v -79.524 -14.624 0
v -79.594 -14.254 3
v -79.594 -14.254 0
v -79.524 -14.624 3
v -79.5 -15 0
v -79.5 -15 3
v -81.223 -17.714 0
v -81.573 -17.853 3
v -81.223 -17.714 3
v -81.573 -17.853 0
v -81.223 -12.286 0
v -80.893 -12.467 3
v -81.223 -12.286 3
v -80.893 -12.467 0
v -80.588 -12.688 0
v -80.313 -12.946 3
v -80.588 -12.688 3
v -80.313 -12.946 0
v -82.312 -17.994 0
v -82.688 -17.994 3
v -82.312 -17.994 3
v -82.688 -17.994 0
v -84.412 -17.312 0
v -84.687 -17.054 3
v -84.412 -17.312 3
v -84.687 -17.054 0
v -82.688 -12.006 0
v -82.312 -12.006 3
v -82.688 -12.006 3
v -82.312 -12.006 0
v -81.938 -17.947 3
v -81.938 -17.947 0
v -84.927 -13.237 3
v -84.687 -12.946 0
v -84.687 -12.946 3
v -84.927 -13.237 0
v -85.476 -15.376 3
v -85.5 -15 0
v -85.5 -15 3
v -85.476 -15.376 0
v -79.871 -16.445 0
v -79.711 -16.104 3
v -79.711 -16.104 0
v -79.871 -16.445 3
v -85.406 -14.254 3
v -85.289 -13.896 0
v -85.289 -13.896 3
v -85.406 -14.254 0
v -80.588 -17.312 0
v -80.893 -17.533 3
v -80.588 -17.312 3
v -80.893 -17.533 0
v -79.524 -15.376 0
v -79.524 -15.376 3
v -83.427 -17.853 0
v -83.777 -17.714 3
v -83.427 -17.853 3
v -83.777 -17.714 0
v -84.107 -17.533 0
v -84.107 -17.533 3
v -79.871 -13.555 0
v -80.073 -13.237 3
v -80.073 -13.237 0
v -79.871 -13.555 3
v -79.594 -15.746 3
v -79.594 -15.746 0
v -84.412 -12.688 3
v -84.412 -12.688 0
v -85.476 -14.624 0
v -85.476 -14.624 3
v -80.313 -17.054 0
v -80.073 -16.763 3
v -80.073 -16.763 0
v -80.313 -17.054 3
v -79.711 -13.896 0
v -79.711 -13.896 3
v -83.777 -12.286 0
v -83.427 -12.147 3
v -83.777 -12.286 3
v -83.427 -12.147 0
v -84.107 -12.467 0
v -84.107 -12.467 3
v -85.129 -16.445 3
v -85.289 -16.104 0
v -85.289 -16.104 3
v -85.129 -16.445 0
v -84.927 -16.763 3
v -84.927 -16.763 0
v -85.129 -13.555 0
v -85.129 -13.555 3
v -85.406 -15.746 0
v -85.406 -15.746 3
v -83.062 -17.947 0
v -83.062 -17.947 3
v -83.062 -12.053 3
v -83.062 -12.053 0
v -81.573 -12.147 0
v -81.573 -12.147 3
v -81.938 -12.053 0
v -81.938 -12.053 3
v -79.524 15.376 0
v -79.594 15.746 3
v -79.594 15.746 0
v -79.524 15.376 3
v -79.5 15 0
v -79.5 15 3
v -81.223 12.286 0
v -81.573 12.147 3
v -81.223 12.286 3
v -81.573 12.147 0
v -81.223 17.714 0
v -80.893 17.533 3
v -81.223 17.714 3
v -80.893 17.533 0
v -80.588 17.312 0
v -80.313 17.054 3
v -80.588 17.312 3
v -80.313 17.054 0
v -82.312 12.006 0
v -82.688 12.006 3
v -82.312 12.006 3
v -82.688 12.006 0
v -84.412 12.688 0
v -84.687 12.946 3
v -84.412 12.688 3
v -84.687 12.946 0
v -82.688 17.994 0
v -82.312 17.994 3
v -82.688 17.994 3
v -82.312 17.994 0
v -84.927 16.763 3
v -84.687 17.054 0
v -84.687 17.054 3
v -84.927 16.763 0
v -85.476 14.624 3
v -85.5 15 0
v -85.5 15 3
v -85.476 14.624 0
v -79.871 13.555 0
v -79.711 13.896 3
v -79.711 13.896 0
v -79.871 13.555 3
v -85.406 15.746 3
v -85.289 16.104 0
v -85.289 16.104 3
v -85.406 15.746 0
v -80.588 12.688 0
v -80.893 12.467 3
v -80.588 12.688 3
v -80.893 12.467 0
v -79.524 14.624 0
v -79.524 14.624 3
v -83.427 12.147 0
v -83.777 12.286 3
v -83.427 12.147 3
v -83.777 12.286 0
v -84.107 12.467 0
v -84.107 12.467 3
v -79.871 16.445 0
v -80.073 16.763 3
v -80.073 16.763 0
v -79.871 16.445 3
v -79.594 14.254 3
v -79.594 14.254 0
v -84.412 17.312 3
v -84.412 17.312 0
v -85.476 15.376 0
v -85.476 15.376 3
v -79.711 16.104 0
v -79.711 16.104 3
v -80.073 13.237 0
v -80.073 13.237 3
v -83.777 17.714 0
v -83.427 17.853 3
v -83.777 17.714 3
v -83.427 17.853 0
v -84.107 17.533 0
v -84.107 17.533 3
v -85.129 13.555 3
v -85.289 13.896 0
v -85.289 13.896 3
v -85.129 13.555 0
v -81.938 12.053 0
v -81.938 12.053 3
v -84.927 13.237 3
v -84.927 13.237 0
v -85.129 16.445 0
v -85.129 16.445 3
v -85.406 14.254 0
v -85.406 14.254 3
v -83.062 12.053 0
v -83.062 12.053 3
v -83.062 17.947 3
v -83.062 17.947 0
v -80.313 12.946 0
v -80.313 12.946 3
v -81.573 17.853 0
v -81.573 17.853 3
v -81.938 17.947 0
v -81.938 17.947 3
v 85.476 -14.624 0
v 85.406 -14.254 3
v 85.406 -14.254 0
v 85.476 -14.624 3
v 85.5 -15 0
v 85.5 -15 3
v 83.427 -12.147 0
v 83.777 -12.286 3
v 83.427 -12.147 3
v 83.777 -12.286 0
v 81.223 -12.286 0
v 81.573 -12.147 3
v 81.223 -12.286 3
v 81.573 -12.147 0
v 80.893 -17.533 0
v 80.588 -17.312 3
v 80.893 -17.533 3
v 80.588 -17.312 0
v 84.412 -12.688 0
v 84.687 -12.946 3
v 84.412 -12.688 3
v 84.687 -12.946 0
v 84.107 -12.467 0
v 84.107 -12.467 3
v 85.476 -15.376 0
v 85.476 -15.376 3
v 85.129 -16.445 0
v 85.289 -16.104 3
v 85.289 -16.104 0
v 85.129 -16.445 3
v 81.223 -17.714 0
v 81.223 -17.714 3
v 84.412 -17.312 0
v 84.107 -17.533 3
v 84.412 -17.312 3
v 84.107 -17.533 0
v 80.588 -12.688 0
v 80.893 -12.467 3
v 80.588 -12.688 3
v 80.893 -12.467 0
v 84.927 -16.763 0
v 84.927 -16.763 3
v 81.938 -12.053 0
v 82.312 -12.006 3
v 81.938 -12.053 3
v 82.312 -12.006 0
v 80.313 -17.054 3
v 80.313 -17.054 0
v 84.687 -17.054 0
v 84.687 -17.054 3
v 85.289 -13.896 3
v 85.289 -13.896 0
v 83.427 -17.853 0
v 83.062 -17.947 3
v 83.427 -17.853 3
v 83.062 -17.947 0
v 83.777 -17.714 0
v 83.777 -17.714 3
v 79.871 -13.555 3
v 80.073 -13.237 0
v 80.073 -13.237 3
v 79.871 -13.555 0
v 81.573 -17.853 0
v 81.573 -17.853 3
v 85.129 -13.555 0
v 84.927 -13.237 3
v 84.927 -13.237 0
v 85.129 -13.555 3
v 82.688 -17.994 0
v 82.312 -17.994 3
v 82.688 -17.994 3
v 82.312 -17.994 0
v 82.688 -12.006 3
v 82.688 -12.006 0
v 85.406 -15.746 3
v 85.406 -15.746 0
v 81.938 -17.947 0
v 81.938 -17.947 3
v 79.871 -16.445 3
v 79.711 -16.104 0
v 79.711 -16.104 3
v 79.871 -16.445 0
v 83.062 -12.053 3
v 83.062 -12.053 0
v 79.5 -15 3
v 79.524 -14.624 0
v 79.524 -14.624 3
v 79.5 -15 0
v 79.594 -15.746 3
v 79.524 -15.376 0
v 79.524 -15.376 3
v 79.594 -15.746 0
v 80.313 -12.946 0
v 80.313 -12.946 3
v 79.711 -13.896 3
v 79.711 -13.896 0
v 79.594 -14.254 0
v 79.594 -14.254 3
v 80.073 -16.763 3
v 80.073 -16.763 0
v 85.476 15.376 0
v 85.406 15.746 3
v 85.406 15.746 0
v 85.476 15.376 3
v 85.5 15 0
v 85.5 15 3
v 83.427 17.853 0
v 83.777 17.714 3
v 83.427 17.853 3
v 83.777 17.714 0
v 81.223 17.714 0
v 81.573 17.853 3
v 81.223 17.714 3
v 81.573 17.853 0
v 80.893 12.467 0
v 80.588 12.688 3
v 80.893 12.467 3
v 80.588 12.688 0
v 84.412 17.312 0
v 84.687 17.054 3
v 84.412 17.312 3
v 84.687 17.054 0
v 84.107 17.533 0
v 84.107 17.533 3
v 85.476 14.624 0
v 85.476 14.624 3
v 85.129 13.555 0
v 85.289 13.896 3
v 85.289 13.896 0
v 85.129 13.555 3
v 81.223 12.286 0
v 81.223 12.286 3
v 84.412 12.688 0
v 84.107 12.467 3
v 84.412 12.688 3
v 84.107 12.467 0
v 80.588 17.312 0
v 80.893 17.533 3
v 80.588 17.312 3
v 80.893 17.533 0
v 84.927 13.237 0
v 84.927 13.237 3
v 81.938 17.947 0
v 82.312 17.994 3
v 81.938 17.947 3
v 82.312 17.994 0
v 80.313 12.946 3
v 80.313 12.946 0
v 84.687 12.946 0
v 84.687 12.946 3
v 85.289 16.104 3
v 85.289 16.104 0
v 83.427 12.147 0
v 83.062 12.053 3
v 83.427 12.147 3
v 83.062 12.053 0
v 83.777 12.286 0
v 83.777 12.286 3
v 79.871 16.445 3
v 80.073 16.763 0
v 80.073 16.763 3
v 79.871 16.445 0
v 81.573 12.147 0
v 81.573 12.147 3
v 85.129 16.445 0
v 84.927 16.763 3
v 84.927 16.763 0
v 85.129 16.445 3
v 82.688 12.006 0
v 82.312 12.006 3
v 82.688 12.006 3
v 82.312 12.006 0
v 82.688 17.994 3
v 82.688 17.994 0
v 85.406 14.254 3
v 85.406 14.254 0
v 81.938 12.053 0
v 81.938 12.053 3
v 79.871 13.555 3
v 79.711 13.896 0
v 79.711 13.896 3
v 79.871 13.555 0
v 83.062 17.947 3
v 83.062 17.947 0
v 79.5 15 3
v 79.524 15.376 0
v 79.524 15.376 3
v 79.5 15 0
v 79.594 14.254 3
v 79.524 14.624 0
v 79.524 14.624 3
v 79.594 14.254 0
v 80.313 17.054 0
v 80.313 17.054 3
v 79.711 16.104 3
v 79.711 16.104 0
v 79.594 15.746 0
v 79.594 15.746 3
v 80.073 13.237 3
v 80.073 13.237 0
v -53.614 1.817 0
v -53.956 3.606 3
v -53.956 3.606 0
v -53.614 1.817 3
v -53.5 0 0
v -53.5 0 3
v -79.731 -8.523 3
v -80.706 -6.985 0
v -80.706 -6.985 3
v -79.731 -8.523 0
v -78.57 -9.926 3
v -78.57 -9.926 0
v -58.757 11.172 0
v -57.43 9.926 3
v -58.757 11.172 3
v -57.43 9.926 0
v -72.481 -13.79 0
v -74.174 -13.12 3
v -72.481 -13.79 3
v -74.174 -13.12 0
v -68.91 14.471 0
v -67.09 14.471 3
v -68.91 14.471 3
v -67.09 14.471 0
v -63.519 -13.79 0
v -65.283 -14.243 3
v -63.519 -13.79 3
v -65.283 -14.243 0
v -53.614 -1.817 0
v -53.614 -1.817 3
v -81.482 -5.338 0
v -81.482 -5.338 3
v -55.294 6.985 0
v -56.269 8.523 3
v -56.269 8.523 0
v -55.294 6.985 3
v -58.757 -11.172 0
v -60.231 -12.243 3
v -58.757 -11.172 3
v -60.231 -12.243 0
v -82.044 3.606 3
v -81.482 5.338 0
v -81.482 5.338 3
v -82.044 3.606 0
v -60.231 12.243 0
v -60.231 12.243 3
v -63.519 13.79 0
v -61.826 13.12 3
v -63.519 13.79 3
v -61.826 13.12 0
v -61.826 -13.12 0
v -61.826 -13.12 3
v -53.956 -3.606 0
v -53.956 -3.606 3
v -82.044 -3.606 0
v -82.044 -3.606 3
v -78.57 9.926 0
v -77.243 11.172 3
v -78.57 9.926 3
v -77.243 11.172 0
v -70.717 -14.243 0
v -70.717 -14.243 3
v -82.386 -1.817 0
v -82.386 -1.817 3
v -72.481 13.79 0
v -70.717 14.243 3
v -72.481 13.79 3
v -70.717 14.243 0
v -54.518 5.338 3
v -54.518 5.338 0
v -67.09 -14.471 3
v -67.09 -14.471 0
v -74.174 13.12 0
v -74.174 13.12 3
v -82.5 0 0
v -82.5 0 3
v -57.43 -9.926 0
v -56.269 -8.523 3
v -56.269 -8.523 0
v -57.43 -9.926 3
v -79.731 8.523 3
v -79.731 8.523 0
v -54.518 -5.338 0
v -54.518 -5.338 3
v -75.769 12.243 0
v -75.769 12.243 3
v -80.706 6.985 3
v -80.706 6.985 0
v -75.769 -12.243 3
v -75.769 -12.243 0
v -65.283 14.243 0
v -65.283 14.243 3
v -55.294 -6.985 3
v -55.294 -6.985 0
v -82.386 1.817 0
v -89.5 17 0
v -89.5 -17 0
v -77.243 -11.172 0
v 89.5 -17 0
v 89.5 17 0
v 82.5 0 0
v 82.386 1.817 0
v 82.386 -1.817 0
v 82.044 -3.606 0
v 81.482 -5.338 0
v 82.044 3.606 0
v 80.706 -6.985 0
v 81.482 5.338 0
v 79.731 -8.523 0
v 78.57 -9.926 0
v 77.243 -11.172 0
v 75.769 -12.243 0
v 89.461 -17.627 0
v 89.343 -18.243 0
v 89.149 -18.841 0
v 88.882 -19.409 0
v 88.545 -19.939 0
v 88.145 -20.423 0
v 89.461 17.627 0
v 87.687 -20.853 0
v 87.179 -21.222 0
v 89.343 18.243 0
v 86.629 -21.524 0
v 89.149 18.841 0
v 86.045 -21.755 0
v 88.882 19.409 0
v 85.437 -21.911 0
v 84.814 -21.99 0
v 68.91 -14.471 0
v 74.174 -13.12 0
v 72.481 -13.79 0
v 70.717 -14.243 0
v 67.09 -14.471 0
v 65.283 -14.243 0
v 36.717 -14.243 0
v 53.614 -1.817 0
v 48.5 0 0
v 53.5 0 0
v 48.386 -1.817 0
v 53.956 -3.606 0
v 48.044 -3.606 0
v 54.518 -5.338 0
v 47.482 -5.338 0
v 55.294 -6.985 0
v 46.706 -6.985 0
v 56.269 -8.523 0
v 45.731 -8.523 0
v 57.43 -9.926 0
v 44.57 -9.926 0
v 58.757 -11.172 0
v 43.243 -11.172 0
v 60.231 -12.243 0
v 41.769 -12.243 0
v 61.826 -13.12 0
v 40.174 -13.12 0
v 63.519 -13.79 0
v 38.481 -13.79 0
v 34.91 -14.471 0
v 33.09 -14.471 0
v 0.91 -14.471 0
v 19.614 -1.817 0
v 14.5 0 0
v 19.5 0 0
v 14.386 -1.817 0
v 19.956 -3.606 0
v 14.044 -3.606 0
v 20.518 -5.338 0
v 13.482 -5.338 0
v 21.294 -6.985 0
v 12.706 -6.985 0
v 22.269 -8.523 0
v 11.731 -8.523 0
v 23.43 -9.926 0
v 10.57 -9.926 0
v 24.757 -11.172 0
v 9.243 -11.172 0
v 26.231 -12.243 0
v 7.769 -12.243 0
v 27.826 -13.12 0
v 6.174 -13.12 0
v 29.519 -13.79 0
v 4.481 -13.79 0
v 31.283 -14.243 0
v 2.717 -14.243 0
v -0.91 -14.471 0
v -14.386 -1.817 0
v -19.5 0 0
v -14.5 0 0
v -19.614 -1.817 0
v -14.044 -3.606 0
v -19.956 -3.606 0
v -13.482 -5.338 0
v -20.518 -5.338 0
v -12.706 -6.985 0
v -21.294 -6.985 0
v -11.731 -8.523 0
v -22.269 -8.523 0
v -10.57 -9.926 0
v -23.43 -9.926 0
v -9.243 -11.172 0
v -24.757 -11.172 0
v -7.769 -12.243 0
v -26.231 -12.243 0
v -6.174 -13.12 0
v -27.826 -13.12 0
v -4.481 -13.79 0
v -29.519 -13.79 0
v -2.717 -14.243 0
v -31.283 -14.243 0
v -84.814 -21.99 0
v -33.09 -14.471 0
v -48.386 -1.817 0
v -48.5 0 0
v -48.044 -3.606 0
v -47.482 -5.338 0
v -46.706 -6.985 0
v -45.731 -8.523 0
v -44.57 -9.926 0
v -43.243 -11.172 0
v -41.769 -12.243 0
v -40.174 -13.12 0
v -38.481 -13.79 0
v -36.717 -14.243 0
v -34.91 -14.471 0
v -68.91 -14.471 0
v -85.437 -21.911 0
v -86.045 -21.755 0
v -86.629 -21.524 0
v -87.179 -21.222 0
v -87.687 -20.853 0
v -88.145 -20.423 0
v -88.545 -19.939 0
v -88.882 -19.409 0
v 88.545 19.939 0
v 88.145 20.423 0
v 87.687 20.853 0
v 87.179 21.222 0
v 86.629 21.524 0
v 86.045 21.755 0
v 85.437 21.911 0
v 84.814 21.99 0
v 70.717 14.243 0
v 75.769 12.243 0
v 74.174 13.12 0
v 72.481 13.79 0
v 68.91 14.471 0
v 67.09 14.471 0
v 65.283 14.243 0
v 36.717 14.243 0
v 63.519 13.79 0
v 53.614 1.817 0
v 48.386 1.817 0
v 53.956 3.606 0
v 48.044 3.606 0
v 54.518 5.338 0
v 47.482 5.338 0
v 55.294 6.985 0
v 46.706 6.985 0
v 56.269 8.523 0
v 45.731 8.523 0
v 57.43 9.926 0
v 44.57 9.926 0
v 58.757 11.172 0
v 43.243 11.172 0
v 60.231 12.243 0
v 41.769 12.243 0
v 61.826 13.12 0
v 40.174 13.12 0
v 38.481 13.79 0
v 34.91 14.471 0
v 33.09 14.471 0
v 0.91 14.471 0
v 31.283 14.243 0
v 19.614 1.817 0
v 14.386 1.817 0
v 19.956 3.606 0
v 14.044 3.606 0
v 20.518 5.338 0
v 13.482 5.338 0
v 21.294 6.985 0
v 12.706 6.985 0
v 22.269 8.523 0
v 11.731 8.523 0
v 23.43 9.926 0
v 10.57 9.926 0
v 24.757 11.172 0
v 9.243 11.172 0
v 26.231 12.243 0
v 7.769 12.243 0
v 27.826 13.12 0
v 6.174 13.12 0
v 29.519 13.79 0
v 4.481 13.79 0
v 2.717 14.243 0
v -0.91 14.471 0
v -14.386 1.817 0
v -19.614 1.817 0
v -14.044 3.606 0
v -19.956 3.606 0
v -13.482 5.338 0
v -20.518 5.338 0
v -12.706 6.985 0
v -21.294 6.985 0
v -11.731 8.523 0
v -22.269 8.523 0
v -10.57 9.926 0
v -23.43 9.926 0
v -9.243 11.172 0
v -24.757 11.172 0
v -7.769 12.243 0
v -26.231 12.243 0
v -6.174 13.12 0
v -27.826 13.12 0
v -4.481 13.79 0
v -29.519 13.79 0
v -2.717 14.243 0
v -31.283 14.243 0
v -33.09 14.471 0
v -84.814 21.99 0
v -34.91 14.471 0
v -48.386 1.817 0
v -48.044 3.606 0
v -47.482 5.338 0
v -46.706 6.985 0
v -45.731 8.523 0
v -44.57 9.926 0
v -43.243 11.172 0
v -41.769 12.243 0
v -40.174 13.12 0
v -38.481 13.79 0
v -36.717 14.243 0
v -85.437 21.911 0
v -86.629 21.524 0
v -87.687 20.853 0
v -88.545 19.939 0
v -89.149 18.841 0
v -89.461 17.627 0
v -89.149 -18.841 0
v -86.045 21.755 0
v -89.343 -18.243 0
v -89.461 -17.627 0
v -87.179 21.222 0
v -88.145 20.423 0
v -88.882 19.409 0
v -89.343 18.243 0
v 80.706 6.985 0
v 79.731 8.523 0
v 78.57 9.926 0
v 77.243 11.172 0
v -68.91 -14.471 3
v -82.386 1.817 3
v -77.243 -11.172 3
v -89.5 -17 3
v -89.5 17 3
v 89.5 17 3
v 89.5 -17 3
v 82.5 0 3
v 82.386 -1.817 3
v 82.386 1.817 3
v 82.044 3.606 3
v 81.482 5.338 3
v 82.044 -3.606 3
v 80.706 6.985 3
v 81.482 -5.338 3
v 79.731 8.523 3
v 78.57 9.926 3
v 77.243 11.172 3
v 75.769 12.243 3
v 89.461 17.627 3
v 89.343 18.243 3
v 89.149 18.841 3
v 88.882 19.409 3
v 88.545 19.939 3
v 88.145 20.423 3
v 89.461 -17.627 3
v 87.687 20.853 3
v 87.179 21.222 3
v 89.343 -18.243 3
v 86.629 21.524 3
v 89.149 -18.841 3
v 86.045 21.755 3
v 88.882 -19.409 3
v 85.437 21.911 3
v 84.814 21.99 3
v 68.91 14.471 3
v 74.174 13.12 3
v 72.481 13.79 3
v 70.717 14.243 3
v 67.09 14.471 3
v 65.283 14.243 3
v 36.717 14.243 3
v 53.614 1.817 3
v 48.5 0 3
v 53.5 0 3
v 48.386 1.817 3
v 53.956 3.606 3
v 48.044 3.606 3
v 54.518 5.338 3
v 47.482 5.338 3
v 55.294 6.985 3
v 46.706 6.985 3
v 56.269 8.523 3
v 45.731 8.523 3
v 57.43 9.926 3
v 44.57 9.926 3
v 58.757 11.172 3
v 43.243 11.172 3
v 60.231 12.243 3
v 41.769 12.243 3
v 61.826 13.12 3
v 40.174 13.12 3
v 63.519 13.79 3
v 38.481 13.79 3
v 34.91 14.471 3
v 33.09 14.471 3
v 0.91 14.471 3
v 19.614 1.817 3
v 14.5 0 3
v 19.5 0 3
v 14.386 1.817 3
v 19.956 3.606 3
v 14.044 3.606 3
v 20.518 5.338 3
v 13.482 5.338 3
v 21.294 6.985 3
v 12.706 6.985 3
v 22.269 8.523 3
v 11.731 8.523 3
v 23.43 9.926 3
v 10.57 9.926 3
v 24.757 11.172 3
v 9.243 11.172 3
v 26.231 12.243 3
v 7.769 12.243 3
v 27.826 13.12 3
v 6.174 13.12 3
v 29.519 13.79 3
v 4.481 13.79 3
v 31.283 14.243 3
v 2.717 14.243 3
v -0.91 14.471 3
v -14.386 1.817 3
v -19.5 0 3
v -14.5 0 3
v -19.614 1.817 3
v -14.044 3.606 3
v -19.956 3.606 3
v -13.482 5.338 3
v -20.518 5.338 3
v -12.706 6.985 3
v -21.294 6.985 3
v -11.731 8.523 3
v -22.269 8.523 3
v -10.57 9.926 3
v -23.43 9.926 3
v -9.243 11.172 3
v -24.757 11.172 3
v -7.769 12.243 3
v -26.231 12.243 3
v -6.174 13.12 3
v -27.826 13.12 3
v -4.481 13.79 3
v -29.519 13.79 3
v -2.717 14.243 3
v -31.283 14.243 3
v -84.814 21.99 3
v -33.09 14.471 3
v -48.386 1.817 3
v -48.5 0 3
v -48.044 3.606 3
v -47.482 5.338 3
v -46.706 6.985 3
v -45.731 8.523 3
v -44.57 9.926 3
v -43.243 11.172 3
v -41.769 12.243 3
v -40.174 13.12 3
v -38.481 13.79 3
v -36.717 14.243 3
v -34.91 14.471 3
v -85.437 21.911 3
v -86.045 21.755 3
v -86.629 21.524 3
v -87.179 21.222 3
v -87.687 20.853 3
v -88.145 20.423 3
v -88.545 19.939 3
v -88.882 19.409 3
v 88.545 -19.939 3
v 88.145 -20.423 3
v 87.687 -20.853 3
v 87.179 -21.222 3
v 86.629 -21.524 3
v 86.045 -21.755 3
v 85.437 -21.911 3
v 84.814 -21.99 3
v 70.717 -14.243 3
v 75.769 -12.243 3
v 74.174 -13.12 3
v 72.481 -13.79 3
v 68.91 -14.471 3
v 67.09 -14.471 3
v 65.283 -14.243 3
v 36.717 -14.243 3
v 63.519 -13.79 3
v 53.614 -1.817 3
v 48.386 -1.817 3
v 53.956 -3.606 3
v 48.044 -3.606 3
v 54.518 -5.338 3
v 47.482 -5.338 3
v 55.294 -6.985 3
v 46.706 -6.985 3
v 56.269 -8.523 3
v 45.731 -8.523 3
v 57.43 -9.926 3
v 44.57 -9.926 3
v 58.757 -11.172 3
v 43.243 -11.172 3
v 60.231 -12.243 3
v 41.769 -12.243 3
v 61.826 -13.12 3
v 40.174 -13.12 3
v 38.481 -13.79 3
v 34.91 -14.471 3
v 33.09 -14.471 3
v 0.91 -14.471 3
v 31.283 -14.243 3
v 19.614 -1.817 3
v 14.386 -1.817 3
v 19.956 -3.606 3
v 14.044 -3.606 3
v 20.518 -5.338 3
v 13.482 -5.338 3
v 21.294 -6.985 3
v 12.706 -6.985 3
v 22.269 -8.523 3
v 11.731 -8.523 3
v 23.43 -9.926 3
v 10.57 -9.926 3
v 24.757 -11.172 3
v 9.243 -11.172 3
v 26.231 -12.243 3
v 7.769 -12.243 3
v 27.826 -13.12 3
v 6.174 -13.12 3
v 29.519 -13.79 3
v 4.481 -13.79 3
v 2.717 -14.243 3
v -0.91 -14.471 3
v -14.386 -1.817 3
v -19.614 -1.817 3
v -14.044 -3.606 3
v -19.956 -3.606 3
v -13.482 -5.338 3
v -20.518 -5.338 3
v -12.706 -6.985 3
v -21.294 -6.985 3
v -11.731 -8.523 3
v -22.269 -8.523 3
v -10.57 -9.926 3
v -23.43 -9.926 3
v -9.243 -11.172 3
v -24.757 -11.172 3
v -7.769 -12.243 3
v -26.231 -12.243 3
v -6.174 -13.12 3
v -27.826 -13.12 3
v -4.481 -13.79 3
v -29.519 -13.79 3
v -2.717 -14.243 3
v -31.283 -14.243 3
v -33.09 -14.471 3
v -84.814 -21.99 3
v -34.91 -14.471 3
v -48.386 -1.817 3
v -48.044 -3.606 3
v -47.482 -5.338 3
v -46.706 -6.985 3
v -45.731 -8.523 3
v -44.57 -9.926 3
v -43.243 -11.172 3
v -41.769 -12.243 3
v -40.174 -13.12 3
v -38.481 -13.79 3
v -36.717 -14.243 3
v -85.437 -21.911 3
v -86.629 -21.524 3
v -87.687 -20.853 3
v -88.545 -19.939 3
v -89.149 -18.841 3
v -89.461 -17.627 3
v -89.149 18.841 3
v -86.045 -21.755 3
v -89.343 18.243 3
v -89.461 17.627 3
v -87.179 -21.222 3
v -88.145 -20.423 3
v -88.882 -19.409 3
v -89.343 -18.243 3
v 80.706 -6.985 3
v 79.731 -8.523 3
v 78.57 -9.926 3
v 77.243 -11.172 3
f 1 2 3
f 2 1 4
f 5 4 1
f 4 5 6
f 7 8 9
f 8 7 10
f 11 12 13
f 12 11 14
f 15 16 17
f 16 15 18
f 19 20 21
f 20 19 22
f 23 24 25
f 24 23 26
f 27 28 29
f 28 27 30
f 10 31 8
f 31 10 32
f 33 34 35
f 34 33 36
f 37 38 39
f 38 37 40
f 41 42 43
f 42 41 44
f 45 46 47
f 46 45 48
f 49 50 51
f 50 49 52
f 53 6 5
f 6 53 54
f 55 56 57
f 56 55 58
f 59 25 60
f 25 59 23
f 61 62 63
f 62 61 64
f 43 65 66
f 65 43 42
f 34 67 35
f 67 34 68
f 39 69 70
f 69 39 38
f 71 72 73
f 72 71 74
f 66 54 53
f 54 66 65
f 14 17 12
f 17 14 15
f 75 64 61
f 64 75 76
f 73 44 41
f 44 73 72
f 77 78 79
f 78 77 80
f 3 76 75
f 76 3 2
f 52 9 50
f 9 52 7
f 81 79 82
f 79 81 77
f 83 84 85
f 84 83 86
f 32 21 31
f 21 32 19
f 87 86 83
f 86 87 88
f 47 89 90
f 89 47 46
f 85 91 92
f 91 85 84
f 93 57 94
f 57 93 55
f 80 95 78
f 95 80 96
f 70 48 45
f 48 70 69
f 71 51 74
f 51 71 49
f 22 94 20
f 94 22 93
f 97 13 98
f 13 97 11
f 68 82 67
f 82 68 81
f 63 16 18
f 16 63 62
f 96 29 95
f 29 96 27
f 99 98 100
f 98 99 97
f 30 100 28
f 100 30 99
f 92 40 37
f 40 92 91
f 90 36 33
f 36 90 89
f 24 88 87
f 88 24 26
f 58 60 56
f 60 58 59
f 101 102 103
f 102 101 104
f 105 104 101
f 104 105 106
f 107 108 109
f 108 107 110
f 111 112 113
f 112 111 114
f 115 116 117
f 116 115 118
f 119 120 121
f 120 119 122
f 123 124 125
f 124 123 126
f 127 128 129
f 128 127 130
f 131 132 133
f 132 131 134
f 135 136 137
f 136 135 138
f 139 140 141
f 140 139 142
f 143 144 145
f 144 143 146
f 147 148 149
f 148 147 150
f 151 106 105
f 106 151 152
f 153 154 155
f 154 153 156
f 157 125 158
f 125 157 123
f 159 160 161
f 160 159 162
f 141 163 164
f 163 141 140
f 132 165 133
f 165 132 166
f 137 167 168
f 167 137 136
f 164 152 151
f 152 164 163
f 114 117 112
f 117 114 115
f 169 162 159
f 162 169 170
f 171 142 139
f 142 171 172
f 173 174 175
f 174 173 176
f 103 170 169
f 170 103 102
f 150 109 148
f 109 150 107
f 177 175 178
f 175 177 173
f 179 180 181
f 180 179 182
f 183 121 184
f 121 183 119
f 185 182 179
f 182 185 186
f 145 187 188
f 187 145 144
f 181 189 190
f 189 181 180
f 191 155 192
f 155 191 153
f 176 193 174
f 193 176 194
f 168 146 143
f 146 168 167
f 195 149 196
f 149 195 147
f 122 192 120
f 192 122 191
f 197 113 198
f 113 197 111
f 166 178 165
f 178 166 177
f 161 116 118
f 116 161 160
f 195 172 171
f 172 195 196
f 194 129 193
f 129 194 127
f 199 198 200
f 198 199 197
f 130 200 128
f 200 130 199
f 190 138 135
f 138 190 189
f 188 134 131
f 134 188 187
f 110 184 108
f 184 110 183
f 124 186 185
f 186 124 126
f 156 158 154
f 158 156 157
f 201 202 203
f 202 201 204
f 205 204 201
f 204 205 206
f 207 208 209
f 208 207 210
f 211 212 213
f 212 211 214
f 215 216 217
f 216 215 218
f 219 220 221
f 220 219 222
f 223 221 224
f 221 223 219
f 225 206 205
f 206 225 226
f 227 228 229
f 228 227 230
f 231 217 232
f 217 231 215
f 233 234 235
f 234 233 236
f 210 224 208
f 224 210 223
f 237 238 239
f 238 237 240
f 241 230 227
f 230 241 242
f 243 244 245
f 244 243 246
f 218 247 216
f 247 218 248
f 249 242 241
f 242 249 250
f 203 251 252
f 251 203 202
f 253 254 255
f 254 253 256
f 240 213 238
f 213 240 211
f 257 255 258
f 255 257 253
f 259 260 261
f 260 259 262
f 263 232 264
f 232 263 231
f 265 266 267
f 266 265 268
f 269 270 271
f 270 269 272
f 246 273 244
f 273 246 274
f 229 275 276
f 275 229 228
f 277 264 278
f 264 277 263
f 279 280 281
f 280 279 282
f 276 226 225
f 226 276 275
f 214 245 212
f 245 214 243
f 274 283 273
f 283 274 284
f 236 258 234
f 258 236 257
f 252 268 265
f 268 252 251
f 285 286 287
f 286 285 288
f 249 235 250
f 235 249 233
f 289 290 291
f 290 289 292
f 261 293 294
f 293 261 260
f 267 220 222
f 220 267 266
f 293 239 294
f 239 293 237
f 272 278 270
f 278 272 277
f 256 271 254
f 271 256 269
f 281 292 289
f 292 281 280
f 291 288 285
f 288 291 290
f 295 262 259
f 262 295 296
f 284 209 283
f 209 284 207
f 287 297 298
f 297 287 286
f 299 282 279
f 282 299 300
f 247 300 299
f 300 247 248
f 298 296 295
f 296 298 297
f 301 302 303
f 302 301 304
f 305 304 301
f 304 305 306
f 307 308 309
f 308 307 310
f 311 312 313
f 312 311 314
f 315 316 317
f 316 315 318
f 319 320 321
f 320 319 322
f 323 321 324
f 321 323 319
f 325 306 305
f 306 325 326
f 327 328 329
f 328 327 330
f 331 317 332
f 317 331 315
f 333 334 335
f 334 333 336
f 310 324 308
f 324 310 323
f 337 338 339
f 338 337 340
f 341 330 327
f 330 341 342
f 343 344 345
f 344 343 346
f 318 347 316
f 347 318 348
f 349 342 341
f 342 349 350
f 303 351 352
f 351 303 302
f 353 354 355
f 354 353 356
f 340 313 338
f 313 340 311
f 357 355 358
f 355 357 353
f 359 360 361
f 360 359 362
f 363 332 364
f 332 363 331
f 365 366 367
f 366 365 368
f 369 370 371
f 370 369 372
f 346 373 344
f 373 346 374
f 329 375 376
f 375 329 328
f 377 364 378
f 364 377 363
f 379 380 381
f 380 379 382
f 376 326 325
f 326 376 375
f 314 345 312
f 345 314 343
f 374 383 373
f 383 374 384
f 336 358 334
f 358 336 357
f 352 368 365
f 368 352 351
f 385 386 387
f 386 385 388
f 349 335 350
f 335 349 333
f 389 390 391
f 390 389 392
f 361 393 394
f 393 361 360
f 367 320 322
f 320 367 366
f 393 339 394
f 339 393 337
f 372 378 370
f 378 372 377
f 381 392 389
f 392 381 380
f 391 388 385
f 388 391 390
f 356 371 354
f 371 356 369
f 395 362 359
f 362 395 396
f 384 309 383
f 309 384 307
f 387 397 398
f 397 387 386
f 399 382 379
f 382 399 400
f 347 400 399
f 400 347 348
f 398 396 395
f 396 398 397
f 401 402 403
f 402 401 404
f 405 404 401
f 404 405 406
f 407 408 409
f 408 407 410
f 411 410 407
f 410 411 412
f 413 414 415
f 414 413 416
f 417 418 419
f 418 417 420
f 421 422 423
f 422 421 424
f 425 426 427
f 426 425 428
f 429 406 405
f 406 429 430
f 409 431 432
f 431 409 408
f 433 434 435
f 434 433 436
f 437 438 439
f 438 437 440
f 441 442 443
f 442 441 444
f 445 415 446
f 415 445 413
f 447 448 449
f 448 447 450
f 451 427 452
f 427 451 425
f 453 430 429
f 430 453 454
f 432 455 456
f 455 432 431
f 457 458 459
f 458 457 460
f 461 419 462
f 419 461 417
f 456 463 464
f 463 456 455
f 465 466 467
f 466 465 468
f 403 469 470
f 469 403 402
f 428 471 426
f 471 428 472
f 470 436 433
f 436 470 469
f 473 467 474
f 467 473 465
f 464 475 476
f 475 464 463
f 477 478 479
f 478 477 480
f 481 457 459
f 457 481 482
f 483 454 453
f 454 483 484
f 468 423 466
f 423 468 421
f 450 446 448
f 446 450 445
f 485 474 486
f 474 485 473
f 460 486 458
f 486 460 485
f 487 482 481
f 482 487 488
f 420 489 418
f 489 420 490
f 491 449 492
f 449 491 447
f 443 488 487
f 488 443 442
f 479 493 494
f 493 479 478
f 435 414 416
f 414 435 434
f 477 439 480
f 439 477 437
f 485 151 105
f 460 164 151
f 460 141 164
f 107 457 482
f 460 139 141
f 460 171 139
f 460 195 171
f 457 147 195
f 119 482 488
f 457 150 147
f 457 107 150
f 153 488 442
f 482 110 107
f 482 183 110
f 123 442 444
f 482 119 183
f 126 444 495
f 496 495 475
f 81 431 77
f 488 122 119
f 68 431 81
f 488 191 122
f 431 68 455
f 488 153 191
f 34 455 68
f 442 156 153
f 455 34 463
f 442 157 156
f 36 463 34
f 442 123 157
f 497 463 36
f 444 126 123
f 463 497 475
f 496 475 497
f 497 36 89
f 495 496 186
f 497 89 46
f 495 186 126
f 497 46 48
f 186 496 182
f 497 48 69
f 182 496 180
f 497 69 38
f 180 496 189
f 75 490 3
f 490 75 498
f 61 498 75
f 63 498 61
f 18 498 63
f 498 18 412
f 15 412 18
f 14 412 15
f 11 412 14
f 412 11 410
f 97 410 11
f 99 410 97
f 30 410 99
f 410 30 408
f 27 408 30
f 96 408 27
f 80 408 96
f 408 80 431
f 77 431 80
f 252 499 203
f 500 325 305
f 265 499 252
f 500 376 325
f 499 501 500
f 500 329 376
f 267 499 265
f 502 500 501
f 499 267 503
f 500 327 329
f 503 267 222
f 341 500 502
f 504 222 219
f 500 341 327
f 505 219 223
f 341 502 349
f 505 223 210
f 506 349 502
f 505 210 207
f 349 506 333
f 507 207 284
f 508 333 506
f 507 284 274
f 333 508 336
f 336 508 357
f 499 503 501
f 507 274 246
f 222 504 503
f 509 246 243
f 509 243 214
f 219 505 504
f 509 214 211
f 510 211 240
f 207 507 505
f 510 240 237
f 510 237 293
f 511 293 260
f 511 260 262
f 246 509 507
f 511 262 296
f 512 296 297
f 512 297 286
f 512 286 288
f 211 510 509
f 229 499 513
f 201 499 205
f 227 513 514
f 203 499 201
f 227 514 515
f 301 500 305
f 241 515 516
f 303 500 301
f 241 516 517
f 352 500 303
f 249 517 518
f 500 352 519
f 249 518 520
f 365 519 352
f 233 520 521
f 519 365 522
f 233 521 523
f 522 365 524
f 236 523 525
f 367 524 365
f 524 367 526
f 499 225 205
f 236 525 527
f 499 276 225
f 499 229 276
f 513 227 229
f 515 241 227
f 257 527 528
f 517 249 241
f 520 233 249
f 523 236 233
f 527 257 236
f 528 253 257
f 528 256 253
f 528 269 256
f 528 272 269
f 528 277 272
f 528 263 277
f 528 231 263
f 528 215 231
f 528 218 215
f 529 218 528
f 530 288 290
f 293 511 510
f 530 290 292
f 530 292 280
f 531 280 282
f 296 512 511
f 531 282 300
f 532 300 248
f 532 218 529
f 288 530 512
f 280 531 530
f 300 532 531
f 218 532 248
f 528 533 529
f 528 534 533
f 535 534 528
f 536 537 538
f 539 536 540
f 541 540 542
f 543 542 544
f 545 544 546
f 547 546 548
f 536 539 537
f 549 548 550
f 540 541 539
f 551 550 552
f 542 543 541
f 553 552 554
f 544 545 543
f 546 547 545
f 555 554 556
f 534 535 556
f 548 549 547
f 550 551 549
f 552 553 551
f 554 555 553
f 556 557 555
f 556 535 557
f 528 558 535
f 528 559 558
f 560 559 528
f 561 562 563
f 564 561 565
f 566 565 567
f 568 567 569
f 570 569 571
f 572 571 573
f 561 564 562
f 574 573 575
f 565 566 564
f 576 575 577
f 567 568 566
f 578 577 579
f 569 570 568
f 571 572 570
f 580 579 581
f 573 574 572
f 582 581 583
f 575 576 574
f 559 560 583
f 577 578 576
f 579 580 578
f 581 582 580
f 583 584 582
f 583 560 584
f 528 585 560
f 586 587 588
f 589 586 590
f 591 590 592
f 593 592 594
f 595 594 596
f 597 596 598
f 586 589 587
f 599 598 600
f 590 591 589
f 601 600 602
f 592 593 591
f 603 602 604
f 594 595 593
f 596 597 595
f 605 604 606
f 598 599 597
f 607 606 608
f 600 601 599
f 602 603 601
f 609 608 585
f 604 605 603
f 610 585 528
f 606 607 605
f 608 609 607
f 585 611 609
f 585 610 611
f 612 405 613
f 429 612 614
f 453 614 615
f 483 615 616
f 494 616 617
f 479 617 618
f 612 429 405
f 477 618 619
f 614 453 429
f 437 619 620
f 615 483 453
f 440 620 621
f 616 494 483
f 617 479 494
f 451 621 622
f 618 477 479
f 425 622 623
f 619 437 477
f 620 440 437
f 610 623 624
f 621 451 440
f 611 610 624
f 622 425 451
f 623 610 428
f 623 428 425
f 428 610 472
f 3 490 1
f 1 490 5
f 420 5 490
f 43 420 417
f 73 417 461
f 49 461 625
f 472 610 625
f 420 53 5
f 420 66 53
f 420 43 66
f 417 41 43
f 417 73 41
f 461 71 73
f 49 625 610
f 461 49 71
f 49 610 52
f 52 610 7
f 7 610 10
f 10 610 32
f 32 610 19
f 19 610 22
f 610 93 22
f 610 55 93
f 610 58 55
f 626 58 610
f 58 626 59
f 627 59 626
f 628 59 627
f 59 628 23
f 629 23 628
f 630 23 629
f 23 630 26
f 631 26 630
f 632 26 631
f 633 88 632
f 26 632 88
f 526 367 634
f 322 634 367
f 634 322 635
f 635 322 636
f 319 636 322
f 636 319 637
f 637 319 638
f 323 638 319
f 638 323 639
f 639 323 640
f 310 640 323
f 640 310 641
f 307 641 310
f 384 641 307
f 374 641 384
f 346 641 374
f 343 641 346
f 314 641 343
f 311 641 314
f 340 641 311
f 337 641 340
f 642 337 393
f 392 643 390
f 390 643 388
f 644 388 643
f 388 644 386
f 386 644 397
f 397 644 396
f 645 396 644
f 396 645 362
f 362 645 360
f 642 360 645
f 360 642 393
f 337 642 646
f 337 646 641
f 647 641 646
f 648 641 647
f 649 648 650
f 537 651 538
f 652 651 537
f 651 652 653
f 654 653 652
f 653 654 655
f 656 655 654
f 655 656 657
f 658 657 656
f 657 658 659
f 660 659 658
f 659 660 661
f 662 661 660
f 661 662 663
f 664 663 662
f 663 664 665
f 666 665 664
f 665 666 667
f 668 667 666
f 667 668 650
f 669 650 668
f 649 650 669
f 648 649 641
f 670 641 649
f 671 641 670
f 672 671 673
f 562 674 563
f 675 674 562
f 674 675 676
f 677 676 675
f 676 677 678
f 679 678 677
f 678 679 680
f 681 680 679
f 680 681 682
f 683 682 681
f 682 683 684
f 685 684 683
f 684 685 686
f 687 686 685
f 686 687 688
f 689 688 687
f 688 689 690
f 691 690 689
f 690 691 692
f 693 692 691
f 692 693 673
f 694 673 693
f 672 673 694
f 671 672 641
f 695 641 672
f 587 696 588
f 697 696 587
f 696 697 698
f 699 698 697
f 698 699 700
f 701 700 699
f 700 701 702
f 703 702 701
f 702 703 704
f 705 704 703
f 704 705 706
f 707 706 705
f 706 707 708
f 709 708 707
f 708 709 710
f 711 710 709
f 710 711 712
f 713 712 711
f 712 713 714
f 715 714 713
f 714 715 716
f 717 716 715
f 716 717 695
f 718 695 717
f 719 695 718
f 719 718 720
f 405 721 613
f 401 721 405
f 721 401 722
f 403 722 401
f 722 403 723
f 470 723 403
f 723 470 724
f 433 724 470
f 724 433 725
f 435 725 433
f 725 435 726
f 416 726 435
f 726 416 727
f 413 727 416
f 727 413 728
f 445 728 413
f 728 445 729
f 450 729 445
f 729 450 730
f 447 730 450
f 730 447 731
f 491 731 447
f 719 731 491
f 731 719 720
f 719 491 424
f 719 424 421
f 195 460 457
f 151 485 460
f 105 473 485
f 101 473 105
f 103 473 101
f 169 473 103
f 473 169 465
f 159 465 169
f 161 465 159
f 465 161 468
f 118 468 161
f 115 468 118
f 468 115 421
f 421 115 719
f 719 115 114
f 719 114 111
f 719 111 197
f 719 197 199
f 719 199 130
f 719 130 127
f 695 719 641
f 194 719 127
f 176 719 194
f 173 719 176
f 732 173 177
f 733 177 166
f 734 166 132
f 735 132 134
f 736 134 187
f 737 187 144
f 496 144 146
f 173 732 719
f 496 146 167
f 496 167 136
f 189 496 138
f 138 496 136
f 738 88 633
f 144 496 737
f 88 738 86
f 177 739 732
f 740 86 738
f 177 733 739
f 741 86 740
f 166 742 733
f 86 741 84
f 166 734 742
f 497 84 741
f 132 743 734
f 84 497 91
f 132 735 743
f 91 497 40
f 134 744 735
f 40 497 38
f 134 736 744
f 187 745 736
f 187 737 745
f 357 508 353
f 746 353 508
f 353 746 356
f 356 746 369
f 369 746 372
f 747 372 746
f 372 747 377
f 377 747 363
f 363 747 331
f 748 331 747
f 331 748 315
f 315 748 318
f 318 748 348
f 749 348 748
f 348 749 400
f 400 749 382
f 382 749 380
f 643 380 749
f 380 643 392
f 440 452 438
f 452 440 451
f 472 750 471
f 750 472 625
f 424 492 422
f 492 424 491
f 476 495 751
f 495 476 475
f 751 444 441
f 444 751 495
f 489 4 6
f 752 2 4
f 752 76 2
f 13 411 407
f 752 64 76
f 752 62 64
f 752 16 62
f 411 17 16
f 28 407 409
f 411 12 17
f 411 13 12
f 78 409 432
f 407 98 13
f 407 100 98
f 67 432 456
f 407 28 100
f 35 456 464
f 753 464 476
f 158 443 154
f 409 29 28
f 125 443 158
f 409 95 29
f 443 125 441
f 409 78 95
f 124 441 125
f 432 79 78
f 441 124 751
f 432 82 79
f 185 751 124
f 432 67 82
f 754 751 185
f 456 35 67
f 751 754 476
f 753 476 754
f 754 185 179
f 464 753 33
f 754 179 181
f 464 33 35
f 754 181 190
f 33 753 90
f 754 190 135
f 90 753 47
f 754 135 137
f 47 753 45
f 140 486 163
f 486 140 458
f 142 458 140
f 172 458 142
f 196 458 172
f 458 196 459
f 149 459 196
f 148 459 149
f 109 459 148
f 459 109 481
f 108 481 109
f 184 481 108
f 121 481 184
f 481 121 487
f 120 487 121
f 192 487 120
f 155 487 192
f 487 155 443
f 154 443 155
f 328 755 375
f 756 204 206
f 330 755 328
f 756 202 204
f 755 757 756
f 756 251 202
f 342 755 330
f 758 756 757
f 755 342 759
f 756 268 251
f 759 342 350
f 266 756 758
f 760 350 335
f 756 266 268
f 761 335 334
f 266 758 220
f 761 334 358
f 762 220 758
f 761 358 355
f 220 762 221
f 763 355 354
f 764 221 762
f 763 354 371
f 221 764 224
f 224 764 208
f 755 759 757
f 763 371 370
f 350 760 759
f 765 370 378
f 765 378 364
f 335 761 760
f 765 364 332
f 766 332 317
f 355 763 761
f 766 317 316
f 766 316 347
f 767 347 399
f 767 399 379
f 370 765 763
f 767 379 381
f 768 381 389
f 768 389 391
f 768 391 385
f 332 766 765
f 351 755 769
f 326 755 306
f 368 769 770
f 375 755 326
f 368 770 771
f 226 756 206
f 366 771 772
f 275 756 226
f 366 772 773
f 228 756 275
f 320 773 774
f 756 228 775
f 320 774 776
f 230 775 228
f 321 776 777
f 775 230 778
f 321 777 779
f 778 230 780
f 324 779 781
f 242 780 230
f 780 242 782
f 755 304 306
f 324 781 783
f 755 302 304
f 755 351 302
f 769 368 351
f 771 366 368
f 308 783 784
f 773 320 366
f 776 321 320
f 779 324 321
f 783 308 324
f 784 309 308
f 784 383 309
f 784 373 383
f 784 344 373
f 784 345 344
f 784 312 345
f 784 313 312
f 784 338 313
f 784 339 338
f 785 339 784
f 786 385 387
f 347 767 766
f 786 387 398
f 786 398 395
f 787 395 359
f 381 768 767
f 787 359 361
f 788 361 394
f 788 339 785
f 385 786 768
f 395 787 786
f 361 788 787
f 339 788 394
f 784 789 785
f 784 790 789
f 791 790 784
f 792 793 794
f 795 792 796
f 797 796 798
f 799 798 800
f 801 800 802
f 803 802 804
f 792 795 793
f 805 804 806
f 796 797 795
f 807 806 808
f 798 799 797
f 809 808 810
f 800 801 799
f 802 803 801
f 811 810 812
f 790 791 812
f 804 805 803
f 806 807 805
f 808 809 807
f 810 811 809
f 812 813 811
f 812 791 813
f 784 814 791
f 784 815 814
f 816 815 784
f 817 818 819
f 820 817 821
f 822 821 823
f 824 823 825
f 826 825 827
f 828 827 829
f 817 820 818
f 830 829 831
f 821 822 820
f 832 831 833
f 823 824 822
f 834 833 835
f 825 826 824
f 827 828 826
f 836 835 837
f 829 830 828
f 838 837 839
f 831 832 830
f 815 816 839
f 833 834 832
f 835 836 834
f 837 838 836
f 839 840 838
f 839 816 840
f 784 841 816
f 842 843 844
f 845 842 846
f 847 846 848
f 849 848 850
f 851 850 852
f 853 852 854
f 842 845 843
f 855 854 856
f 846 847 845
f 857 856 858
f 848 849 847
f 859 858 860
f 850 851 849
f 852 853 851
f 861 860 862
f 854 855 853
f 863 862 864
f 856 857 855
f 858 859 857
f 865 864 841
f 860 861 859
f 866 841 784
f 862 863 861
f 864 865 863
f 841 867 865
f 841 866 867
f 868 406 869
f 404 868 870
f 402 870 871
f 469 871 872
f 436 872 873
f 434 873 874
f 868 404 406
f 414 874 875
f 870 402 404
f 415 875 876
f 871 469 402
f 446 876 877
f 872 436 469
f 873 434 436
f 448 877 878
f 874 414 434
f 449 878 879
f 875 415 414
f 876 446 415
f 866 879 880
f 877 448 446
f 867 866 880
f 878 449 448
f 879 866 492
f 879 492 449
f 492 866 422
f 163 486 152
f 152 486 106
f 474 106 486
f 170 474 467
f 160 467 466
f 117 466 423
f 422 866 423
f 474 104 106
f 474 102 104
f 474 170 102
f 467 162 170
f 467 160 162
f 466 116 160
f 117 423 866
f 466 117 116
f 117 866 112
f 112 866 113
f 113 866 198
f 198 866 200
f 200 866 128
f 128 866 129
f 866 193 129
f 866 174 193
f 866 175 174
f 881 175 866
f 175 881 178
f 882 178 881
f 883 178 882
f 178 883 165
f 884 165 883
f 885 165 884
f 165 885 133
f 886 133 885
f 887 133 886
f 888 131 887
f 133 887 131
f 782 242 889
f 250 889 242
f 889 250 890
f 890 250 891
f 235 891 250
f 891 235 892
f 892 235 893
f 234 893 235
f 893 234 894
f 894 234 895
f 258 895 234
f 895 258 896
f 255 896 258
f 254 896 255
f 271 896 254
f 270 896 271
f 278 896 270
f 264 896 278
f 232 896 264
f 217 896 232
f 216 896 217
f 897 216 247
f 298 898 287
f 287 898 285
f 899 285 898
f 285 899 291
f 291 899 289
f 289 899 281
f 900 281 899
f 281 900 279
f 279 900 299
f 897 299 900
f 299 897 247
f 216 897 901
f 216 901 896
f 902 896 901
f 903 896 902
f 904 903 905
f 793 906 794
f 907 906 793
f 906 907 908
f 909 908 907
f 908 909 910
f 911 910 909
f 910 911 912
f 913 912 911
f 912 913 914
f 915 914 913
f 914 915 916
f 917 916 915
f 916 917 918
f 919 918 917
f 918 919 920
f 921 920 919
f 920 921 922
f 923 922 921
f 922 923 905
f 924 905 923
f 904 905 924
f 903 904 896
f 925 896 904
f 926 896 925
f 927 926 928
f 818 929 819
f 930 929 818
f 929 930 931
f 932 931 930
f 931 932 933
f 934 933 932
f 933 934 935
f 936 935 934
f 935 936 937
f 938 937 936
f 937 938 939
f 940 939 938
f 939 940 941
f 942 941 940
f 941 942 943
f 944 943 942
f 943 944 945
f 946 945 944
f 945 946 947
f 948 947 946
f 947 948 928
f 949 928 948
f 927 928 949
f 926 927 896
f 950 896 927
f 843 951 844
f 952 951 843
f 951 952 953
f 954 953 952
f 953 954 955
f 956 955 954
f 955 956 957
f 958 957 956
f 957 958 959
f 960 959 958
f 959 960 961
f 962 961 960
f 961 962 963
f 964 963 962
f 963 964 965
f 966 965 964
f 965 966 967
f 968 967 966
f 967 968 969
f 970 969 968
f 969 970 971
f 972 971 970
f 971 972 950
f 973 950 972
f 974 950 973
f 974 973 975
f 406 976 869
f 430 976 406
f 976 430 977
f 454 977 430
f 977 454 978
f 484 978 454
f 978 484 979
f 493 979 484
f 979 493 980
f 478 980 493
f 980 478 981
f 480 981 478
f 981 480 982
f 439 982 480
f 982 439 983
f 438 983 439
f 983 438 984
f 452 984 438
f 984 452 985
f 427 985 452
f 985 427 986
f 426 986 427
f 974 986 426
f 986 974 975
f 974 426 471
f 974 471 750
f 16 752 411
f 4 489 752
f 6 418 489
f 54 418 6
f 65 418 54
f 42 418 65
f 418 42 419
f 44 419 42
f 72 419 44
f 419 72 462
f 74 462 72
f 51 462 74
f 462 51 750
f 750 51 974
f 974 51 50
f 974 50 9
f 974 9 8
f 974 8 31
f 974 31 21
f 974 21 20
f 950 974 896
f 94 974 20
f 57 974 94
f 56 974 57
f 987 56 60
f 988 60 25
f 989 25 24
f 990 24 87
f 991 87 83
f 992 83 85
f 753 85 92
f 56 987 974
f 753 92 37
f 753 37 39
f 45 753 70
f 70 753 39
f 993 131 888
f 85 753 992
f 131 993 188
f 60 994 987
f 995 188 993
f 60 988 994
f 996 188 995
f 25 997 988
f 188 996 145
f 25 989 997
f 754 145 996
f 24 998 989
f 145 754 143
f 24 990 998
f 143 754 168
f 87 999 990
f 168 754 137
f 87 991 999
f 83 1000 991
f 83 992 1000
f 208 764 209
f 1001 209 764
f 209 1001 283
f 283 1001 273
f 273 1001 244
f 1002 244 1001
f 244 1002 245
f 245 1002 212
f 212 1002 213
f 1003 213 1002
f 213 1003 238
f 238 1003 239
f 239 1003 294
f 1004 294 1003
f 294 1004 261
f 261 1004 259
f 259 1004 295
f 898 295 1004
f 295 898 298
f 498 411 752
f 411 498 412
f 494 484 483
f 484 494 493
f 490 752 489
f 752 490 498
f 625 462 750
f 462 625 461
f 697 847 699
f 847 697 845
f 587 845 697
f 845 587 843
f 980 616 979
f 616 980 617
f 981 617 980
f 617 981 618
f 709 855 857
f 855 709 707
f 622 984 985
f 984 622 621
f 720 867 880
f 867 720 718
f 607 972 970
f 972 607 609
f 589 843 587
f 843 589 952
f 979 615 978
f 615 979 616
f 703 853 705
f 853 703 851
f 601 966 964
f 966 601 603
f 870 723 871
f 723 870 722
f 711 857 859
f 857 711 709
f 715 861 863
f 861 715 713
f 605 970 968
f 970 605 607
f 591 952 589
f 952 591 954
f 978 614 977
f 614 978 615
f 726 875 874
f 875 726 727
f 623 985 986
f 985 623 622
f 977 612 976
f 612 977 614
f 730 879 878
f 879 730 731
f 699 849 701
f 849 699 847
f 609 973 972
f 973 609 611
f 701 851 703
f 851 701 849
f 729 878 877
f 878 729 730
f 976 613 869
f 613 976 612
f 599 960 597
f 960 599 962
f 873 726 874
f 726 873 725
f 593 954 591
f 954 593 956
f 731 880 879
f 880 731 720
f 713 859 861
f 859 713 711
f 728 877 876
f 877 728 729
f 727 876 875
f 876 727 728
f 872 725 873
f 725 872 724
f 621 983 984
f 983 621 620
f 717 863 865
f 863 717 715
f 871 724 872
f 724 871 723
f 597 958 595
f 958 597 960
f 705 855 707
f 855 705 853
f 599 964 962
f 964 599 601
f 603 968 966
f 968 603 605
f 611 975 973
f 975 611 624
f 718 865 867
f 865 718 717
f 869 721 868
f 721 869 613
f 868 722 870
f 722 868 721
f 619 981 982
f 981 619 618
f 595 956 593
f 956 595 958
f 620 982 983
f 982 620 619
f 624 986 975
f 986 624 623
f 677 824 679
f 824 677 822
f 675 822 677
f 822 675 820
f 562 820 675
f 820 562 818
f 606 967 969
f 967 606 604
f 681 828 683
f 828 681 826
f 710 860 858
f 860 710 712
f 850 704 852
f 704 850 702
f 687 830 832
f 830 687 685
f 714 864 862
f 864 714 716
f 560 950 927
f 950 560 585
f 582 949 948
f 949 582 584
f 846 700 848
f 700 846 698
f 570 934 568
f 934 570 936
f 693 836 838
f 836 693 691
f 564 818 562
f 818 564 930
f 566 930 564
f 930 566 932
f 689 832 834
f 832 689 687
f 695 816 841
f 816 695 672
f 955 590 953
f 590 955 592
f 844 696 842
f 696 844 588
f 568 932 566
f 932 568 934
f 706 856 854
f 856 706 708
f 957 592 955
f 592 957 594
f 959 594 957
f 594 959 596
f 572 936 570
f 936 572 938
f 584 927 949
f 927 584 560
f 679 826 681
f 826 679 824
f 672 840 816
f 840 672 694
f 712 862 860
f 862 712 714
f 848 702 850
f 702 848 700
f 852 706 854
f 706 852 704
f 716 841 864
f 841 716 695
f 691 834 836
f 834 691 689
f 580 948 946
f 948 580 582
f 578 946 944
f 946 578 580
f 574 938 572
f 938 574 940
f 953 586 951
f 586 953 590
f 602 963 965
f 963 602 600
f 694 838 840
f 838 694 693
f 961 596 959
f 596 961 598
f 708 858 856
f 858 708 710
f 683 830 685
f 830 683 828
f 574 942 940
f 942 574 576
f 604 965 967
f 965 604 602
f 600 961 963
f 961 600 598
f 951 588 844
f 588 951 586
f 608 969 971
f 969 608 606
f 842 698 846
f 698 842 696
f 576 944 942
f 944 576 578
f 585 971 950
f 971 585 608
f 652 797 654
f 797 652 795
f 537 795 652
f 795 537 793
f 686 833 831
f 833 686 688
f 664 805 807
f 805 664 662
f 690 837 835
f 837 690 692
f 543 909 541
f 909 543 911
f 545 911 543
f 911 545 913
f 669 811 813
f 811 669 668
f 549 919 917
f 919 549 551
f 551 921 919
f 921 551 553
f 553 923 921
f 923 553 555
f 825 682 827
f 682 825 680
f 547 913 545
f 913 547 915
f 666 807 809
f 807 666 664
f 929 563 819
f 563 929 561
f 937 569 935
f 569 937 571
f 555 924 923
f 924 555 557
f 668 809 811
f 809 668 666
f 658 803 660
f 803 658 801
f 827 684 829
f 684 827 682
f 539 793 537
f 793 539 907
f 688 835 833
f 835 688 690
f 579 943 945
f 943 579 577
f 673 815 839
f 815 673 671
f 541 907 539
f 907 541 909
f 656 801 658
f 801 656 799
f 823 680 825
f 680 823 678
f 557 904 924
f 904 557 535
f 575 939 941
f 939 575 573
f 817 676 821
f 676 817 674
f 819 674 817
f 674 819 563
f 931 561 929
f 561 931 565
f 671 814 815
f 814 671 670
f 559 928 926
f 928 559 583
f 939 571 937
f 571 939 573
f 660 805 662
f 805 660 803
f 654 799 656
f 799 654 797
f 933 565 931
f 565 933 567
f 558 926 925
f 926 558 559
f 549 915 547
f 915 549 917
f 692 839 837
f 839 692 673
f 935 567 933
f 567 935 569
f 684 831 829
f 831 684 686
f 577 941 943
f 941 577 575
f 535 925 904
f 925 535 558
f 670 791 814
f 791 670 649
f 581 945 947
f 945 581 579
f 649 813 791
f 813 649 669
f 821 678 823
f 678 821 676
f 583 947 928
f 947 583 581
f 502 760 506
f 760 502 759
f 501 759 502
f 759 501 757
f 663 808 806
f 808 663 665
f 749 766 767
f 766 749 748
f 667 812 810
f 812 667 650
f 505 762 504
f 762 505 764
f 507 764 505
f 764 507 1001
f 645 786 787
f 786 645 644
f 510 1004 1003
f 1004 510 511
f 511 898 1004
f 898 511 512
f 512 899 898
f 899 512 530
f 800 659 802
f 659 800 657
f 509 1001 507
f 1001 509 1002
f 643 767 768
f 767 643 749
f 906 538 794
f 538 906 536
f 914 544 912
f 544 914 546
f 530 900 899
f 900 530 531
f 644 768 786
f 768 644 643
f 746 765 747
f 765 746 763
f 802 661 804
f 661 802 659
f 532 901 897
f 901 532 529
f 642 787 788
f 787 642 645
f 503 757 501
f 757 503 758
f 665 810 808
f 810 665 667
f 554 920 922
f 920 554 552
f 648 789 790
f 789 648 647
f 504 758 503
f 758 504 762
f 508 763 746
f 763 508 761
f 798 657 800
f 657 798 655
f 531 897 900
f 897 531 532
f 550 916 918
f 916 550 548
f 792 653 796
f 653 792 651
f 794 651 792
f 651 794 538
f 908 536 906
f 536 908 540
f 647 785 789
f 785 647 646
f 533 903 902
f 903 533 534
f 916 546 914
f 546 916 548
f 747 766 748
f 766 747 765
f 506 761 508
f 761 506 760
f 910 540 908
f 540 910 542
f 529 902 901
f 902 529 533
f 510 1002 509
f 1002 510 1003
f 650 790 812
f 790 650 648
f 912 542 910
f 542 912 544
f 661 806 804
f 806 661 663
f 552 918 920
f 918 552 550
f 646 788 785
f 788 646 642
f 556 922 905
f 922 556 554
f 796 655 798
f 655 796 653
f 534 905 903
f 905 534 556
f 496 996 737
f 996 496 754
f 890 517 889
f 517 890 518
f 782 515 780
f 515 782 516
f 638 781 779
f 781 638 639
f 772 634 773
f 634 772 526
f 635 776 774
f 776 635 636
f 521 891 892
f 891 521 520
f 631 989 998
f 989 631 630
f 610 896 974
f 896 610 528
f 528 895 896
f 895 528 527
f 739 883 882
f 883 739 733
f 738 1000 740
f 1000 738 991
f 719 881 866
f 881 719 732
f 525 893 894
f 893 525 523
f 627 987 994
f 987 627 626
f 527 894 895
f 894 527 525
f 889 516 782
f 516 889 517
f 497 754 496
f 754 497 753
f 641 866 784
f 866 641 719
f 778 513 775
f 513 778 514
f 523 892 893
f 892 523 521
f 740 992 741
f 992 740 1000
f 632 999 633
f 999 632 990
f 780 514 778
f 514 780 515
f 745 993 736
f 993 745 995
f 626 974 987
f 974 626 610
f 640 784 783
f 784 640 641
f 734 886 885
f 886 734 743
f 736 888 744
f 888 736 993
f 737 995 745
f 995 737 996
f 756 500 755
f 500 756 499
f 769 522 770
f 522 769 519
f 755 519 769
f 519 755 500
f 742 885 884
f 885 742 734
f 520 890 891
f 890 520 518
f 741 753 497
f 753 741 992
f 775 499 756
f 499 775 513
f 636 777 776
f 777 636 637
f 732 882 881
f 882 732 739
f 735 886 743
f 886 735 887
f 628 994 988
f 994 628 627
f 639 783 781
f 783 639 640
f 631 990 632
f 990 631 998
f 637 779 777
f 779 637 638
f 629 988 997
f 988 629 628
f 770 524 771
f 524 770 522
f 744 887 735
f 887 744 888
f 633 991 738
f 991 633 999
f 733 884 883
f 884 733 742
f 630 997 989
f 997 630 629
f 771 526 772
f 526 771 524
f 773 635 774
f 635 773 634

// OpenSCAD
$fn = 50;


difference() {
	union() {
		hull() {
			translate(v = [-84.5000000000, 17.0000000000, 0]) {
				cylinder(h = 3, r = 5);
			}
			translate(v = [84.5000000000, 17.0000000000, 0]) {
				cylinder(h = 3, r = 5);
			}
			translate(v = [-84.5000000000, -17.0000000000, 0]) {
				cylinder(h = 3, r = 5);
			}
			translate(v = [84.5000000000, -17.0000000000, 0]) {
				cylinder(h = 3, r = 5);
			}
		}
	}
	union() {
		#translate(v = [-82.5000000000, -15.0000000000, -100.0000000000]) {
			cylinder(h = 200, r = 3.0000000000);
		}
		#translate(v = [-82.5000000000, 15.0000000000, -100.0000000000]) {
			cylinder(h = 200, r = 3.0000000000);
		}
		#translate(v = [82.5000000000, -15.0000000000, -100.0000000000]) {
			cylinder(h = 200, r = 3.0000000000);
		}
		#translate(v = [82.5000000000, 15.0000000000, -100.0000000000]) {
			cylinder(h = 200, r = 3.0000000000);
		}
		#translate(v = [-68.0000000000, 0, 0]) {
			cylinder(h = 3, r = 14.5000000000);
		}
		#translate(v = [-34.0000000000, 0, 0]) {
			cylinder(h = 3, r = 14.5000000000);
		}
		#cylinder(h = 3, r = 14.5000000000);
		#translate(v = [34.0000000000, 0, 0]) {
			cylinder(h = 3, r = 14.5000000000);
		}
		#translate(v = [68.0000000000, 0, 0]) {
			cylinder(h = 3, r = 14.5000000000);
		}
	}
}
